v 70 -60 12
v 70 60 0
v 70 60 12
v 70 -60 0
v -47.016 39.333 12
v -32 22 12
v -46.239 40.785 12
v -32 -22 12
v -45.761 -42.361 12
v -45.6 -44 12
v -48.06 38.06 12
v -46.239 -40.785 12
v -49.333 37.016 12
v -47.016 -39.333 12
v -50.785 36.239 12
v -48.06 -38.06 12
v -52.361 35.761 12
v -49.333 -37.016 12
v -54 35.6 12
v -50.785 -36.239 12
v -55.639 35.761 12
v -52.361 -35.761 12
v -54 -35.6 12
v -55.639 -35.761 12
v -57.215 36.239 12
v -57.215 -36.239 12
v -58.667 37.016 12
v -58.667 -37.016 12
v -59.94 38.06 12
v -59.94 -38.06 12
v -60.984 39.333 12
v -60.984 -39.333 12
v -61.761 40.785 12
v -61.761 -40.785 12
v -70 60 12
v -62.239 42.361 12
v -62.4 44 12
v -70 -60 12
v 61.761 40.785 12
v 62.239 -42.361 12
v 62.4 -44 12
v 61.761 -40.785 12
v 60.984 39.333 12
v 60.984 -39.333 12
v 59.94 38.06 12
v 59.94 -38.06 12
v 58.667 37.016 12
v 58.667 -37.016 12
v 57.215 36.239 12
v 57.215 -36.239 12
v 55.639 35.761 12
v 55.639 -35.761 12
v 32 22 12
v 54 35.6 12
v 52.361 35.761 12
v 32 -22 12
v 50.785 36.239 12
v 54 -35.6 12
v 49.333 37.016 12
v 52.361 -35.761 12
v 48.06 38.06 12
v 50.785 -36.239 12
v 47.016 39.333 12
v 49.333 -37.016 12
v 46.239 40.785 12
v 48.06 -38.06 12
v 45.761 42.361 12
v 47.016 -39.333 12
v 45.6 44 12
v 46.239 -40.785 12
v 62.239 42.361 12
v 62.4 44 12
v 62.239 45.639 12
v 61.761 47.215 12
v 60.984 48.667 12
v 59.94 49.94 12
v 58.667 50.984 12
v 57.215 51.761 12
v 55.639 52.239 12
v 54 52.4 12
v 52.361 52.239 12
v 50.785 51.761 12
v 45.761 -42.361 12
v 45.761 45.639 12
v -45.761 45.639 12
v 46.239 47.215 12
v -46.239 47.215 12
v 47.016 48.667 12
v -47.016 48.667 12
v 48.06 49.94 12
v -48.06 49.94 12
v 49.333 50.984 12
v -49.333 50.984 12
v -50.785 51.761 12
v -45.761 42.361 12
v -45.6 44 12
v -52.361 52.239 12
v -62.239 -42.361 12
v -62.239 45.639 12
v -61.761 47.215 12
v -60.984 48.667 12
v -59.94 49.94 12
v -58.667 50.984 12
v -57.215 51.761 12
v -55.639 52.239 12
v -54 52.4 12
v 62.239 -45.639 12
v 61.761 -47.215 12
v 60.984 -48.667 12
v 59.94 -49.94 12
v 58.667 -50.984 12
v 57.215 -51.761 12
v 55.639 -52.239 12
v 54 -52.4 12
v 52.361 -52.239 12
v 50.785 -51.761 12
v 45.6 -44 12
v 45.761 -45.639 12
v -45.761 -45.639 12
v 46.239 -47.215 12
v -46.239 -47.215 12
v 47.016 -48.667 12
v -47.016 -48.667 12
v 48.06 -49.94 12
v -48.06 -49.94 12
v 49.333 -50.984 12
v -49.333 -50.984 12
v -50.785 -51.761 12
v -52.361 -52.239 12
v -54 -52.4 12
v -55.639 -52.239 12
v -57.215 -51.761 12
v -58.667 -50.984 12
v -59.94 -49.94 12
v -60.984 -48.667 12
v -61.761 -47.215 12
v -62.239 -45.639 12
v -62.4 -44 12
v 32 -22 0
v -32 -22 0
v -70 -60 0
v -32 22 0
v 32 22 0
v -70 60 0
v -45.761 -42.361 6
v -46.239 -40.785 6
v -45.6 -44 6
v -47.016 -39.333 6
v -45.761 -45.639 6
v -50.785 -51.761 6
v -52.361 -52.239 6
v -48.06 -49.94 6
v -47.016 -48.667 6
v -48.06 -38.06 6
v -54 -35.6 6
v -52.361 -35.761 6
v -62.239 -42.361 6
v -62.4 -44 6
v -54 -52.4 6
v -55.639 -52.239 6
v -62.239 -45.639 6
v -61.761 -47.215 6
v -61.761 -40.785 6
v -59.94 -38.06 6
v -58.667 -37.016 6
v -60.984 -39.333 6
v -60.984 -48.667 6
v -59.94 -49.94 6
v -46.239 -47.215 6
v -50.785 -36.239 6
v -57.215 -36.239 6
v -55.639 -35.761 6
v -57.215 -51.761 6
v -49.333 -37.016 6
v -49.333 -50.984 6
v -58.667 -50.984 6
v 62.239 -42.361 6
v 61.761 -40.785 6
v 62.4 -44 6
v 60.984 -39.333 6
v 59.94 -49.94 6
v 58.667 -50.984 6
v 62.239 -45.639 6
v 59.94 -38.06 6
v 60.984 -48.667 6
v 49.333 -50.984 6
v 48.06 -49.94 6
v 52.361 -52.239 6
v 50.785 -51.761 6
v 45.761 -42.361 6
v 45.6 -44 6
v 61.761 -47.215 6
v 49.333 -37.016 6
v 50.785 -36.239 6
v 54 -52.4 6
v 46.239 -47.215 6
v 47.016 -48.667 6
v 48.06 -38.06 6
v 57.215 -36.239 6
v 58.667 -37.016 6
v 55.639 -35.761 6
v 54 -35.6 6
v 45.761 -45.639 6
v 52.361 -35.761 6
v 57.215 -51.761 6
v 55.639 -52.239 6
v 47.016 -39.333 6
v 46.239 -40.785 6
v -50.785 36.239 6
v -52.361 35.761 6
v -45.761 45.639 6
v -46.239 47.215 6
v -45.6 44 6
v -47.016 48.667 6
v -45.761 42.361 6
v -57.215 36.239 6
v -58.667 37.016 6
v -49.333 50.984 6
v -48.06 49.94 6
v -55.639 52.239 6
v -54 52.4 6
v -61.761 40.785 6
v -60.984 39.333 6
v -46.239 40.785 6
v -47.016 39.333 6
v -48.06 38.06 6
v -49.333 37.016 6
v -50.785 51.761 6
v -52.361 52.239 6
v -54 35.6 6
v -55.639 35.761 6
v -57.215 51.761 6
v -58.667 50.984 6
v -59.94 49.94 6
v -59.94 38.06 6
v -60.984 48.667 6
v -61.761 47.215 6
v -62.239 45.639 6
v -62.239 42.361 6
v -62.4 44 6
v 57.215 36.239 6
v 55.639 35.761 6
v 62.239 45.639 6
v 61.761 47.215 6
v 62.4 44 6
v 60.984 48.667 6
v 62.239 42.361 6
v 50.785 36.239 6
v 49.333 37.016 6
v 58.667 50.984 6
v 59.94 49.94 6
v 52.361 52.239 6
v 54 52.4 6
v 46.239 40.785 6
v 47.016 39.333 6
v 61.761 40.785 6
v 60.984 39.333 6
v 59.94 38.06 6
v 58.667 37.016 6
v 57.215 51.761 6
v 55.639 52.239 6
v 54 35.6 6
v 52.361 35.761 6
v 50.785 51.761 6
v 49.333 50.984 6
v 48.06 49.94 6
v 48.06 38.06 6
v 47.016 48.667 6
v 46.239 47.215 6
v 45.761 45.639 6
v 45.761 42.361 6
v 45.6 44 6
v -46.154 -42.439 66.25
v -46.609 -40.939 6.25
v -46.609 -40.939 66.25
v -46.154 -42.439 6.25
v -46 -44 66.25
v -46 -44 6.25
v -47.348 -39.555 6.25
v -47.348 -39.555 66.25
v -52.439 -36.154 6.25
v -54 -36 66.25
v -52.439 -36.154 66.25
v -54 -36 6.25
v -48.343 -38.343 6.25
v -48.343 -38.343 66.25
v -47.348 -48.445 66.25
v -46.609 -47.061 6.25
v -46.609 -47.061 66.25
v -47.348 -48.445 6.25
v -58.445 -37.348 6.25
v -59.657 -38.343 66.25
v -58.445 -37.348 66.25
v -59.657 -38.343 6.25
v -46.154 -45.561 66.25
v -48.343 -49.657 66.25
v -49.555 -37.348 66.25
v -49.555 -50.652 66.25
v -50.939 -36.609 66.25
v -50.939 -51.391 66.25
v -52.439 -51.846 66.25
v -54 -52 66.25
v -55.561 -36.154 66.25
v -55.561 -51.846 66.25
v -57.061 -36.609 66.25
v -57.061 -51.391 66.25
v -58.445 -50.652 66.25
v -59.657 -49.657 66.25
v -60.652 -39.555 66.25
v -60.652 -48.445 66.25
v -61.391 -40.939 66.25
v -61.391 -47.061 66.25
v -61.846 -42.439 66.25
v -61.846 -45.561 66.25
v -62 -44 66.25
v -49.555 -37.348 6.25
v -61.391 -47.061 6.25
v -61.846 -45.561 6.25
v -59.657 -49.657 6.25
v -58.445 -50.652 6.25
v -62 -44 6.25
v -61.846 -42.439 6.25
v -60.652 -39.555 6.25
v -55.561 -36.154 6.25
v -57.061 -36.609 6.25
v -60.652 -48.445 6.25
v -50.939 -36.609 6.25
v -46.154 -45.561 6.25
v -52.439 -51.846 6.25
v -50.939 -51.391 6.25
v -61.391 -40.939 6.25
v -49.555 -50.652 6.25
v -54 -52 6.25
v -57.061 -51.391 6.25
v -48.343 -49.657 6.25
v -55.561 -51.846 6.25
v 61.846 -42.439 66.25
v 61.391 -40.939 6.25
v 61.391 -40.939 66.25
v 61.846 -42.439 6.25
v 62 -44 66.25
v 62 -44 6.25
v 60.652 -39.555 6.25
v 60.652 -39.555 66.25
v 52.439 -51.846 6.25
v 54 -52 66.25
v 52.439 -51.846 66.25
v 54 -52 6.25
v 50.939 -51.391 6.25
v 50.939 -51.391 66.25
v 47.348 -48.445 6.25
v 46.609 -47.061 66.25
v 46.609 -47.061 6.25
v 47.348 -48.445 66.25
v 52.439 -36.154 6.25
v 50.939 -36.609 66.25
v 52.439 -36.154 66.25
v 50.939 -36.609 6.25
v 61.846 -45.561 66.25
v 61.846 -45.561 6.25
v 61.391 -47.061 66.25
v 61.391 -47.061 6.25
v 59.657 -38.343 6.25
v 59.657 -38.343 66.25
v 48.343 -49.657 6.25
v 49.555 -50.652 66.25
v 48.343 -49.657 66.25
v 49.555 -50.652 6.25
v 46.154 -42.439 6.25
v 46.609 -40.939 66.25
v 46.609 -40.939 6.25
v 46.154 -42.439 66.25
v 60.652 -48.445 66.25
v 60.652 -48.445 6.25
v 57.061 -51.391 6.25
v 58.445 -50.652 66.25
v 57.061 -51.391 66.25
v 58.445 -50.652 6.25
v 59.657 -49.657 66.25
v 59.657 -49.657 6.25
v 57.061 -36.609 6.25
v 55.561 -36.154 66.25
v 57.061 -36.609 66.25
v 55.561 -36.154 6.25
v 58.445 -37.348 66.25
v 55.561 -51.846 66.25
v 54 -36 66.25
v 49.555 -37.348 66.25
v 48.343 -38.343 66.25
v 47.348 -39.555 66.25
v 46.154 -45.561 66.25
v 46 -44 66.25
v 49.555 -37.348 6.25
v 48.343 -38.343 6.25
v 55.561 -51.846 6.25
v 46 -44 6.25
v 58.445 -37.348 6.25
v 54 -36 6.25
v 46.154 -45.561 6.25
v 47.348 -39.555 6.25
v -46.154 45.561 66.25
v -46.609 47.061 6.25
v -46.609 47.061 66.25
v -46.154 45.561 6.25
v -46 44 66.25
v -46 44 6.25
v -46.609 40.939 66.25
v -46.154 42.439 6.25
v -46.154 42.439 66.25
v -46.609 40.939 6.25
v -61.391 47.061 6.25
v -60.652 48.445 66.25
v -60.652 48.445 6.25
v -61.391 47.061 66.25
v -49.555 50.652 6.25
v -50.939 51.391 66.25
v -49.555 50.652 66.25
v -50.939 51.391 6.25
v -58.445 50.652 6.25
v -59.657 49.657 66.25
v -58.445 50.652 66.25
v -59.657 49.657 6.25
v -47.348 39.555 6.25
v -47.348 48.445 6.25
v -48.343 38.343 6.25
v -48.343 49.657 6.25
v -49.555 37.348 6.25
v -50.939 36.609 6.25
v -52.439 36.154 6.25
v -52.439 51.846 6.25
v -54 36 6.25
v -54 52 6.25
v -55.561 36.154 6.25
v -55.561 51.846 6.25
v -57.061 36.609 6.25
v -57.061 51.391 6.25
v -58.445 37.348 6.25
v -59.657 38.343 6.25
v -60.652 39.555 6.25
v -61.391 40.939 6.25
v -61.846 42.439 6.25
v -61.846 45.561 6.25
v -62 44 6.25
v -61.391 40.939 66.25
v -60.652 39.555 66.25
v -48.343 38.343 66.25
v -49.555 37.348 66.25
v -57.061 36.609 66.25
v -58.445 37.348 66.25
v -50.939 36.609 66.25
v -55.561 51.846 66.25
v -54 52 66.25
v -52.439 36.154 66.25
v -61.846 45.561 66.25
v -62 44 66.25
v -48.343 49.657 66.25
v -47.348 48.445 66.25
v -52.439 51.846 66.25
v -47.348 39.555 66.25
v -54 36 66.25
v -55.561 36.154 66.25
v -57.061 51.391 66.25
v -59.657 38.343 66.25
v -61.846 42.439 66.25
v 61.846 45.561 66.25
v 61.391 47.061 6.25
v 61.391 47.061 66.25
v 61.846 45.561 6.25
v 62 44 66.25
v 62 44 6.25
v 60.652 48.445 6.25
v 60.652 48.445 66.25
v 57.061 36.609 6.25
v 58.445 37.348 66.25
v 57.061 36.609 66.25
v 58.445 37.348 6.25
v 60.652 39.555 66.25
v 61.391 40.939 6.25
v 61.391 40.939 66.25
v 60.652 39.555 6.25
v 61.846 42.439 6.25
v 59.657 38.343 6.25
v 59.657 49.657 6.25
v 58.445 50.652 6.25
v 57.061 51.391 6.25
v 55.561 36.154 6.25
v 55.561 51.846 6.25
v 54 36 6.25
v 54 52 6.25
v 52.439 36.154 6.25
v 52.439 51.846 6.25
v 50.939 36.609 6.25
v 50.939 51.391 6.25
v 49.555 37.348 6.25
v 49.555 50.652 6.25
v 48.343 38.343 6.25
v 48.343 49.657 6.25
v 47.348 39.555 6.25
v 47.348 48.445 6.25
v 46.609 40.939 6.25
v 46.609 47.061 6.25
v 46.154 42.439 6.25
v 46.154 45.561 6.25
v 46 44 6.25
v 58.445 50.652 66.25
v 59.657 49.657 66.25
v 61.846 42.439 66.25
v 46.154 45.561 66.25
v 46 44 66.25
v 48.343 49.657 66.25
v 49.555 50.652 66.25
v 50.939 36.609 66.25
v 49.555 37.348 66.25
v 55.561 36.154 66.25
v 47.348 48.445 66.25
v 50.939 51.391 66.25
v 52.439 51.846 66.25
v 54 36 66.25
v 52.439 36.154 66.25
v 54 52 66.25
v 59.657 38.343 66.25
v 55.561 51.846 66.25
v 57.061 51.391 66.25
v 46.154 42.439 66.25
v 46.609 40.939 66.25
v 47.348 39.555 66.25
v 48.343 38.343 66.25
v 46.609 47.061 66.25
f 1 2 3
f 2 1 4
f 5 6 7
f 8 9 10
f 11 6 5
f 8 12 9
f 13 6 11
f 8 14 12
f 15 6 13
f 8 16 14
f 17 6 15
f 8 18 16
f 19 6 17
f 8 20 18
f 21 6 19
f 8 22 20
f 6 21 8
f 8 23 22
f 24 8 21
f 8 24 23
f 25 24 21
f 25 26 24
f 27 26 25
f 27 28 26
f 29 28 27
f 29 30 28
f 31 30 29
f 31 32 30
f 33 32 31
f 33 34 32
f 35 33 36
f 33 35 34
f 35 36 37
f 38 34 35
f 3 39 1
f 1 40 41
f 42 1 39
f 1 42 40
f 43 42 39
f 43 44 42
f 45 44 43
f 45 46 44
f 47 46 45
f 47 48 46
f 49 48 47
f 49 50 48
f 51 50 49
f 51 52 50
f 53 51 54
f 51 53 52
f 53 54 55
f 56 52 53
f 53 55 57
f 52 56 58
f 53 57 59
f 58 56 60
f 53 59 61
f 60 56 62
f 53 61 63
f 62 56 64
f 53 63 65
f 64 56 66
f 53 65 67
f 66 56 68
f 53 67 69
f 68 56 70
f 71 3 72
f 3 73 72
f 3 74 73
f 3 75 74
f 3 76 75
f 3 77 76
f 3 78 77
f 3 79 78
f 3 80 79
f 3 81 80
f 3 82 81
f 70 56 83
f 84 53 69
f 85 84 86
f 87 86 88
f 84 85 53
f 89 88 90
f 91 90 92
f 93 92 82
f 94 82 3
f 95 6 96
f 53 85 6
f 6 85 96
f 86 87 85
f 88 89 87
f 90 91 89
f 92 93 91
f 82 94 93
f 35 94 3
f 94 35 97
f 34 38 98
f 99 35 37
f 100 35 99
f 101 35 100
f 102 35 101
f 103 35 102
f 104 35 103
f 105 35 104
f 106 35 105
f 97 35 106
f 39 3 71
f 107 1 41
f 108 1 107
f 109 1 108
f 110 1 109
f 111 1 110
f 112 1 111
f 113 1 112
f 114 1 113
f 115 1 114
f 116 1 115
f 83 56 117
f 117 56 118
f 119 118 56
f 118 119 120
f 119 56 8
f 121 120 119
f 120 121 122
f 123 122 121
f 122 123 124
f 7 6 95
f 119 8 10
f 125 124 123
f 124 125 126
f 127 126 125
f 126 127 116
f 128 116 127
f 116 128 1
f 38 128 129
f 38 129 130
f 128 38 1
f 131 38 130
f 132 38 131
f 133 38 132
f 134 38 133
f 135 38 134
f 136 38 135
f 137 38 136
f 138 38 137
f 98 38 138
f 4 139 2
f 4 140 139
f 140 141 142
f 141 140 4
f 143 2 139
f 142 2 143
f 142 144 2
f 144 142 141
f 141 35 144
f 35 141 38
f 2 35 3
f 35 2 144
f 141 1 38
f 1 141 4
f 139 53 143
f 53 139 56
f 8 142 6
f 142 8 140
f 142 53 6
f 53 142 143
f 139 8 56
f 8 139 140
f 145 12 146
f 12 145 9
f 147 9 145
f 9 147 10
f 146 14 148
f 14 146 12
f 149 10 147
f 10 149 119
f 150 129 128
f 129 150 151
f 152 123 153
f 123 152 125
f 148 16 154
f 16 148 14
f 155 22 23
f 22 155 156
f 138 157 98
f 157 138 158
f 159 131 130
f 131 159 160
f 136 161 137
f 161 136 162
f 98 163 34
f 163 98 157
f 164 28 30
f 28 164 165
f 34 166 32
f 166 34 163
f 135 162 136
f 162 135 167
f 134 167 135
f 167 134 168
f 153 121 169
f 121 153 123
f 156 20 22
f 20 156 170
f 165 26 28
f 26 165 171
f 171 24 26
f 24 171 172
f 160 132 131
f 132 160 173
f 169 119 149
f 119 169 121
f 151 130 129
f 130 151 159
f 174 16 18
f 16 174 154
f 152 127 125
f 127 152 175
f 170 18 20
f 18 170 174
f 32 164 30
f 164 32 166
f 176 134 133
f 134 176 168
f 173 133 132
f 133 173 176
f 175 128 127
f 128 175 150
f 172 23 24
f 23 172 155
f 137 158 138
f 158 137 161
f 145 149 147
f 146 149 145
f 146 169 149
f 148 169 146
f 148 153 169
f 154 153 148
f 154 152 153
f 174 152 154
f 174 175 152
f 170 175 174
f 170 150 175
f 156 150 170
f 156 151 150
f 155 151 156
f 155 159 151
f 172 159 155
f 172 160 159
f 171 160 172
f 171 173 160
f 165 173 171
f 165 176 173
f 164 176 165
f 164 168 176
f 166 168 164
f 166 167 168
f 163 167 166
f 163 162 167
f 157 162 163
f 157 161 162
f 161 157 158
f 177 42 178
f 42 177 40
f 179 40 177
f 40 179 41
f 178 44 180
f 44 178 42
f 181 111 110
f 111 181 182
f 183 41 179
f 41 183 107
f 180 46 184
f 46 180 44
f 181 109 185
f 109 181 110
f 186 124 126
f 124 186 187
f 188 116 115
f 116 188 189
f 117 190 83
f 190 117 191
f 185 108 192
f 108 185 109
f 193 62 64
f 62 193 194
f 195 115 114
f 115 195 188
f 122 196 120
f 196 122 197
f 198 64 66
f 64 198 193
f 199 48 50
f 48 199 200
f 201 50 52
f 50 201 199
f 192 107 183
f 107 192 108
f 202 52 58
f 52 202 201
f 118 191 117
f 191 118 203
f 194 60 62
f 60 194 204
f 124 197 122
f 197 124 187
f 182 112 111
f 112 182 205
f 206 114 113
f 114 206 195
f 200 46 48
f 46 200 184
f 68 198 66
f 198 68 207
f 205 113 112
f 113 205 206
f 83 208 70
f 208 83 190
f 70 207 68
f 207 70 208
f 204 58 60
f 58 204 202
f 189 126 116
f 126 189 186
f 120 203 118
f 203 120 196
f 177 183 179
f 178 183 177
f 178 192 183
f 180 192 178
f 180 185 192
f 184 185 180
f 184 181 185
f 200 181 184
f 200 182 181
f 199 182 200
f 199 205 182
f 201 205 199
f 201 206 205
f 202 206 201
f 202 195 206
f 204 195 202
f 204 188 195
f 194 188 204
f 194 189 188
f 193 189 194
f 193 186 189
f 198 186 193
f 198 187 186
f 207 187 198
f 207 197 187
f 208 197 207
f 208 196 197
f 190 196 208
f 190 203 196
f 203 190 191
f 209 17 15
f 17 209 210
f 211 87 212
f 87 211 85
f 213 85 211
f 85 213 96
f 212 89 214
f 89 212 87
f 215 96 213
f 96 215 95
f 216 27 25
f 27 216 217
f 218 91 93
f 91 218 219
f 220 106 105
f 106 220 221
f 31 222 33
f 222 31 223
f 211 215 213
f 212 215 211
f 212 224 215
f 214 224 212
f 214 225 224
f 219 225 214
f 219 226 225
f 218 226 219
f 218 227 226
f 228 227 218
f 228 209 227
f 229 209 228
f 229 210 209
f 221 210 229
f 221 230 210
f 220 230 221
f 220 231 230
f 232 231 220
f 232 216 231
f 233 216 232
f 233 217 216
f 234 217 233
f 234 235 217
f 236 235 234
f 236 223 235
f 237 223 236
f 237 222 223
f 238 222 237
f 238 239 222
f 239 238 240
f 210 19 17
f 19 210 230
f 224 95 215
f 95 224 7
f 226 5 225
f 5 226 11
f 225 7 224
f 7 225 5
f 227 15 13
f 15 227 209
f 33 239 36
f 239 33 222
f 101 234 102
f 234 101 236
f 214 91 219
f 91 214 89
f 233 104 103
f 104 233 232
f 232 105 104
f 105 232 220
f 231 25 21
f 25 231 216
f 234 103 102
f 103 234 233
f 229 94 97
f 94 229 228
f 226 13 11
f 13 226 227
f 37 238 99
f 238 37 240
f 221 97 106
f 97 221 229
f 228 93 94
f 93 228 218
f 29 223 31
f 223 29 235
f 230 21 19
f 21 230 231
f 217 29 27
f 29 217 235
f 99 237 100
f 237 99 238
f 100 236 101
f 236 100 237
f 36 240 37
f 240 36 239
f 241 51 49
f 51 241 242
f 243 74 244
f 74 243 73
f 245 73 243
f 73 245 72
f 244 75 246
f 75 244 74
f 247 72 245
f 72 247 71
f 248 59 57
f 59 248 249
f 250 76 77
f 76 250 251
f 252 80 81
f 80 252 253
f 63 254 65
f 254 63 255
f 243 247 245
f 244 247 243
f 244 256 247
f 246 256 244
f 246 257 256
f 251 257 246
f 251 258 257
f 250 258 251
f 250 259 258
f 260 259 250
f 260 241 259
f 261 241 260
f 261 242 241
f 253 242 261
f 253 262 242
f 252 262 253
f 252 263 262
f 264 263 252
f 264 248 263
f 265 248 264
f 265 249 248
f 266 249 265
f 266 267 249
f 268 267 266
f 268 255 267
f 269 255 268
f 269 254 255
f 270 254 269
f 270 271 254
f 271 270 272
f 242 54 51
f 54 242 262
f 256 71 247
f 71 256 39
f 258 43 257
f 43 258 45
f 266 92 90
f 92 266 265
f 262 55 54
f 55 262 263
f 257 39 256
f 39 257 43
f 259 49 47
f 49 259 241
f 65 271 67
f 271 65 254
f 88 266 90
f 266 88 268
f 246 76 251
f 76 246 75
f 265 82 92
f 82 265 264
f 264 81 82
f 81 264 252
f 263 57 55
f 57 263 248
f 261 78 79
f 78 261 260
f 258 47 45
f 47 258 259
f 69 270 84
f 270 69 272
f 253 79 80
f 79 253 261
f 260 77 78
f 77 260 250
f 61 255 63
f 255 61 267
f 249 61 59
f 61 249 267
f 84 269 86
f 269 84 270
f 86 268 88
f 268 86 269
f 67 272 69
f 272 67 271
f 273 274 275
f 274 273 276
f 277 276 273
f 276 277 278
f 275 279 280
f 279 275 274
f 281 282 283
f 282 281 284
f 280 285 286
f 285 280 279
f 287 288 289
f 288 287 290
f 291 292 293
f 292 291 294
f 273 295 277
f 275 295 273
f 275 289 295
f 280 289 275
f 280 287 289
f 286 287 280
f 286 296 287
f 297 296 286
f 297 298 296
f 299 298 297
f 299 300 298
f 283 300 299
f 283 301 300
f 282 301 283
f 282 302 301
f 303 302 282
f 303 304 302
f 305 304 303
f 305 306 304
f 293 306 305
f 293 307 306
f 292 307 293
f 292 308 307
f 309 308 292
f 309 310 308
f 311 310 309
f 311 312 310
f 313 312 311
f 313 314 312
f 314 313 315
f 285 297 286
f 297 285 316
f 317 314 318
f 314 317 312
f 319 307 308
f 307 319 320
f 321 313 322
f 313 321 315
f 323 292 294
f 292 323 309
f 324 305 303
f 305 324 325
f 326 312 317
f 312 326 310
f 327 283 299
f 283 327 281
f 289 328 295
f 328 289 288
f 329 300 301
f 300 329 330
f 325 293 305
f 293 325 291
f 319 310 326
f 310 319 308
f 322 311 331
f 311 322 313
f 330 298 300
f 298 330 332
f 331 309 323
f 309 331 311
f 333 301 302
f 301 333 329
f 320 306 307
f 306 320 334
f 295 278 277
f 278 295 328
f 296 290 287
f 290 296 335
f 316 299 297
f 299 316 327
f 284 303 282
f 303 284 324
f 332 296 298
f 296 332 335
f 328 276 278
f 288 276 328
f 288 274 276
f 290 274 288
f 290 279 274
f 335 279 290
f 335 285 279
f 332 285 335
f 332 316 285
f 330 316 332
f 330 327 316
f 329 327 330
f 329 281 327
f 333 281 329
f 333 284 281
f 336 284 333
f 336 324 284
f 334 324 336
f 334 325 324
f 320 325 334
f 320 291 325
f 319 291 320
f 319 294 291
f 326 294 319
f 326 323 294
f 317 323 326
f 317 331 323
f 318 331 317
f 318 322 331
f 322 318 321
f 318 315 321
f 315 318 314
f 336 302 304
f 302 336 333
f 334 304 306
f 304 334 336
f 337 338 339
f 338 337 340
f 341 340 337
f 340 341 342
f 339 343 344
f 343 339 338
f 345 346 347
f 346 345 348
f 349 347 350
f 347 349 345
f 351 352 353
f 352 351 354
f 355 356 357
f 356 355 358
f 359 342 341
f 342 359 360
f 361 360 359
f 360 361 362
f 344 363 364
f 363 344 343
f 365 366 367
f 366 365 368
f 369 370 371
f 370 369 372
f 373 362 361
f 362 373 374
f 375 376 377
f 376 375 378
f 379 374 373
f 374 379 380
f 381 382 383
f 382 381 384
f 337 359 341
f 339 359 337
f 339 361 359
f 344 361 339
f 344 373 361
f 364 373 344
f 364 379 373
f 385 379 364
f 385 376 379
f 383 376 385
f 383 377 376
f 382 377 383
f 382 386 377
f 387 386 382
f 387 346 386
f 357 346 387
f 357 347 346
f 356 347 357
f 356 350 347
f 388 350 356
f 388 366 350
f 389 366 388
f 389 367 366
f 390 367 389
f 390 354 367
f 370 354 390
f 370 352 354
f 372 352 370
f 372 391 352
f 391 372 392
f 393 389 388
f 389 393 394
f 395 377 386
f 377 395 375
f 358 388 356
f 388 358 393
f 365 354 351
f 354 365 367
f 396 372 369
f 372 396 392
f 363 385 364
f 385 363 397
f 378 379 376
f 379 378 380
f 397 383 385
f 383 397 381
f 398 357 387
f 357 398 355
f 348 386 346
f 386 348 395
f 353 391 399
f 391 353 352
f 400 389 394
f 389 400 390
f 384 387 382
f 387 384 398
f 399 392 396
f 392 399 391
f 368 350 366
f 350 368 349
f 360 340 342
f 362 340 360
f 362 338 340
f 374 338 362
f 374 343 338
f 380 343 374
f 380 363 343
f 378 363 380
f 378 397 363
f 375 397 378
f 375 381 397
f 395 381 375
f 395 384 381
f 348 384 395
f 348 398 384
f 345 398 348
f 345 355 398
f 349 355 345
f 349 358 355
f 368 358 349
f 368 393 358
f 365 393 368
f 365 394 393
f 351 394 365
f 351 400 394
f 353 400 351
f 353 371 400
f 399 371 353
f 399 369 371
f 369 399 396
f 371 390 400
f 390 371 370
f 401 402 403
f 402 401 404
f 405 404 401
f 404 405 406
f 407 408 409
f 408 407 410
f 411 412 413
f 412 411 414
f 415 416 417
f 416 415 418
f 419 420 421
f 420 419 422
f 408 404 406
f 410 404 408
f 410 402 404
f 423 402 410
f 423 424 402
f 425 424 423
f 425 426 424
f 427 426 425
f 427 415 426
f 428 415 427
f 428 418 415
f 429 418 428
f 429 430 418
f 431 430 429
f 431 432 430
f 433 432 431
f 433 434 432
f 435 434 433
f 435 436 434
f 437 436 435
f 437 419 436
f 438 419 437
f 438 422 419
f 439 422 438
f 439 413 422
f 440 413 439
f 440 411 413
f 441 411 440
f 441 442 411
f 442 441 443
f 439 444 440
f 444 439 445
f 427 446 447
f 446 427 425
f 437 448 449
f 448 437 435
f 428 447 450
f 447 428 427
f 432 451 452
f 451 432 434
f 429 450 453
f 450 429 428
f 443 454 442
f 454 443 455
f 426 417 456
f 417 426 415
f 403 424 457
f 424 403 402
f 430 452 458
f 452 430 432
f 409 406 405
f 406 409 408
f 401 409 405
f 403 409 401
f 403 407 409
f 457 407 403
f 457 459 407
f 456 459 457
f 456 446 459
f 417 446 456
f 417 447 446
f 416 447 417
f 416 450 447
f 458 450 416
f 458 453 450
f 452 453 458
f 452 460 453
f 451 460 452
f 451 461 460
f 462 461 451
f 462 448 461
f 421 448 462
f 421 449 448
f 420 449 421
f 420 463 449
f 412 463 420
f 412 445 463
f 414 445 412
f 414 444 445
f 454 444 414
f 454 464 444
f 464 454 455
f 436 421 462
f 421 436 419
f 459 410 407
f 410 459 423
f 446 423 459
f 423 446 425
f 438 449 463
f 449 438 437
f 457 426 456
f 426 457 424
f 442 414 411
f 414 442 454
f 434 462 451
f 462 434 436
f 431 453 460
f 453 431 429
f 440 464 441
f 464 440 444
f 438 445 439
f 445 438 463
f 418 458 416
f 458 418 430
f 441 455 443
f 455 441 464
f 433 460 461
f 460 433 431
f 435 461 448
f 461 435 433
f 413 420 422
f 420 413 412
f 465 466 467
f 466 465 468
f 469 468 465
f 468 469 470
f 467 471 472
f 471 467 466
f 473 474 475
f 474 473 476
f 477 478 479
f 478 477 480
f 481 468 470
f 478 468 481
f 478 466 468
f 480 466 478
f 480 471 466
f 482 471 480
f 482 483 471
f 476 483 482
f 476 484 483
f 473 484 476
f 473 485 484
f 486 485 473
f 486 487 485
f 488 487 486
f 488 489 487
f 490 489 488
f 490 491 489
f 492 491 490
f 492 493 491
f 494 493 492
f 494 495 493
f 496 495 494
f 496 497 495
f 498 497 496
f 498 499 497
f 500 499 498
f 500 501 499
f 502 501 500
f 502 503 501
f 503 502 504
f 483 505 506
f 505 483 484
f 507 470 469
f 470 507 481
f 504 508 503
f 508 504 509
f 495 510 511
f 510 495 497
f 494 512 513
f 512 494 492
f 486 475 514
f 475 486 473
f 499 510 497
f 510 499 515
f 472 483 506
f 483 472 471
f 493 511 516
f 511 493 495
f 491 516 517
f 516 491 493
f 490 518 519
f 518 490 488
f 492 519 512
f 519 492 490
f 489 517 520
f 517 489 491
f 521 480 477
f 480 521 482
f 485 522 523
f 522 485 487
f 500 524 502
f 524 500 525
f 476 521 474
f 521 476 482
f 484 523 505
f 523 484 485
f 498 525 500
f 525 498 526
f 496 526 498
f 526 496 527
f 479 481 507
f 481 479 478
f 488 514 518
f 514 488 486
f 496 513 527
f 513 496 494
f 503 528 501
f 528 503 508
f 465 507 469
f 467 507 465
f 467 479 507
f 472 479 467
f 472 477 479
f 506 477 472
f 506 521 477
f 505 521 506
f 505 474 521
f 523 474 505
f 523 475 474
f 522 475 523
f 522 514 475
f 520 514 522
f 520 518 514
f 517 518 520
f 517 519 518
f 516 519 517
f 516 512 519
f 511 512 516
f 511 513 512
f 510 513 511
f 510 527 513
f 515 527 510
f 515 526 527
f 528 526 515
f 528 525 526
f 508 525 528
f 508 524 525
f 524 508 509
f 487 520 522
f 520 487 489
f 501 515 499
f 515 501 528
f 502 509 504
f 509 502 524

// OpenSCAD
$fn = 32;

// ------------------------------------------------------------------------
// Frame with four posts: 140 x 120 mm frame, four d16 posts
// Every part is its own module, assembly() places them once.
// ------------------------------------------------------------------------

// --- part 1 ---
module base_frame() {
  difference() {
    translate([-70, -60, 0]) cube([140, 120, 12]);
    translate([-32, -22, -1]) cube([64, 44, 14]);
    translate([-54, -44, 6]) cylinder(h = 7, d = 16.8);
    translate([54, -44, 6]) cylinder(h = 7, d = 16.8);
    translate([-54, 44, 6]) cylinder(h = 7, d = 16.8);
    translate([54, 44, 6]) cylinder(h = 7, d = 16.8);
  }
}

// --- part 2 ---
module post1() {
  cylinder(h = 60, d = 16);
}

// --- part 3 ---
module post2() {
  cylinder(h = 60, d = 16);
}

// --- part 4 ---
module post3() {
  cylinder(h = 60, d = 16);
}

// --- part 5 ---
module post4() {
  cylinder(h = 60, d = 16);
}

// --- assembly ---
module assembly() {
  translate([0, 0, 0]) rotate([0, 0, 0]) base_frame();
  translate([-54, -44, 6.25]) rotate([0, 0, 0]) post1();
  translate([54, -44, 6.25]) rotate([0, 0, 0]) post2();
  translate([-54, 44, 6.25]) rotate([0, 0, 0]) post3();
  translate([54, 44, 6.25]) rotate([0, 0, 0]) post4();
}

assembly();
